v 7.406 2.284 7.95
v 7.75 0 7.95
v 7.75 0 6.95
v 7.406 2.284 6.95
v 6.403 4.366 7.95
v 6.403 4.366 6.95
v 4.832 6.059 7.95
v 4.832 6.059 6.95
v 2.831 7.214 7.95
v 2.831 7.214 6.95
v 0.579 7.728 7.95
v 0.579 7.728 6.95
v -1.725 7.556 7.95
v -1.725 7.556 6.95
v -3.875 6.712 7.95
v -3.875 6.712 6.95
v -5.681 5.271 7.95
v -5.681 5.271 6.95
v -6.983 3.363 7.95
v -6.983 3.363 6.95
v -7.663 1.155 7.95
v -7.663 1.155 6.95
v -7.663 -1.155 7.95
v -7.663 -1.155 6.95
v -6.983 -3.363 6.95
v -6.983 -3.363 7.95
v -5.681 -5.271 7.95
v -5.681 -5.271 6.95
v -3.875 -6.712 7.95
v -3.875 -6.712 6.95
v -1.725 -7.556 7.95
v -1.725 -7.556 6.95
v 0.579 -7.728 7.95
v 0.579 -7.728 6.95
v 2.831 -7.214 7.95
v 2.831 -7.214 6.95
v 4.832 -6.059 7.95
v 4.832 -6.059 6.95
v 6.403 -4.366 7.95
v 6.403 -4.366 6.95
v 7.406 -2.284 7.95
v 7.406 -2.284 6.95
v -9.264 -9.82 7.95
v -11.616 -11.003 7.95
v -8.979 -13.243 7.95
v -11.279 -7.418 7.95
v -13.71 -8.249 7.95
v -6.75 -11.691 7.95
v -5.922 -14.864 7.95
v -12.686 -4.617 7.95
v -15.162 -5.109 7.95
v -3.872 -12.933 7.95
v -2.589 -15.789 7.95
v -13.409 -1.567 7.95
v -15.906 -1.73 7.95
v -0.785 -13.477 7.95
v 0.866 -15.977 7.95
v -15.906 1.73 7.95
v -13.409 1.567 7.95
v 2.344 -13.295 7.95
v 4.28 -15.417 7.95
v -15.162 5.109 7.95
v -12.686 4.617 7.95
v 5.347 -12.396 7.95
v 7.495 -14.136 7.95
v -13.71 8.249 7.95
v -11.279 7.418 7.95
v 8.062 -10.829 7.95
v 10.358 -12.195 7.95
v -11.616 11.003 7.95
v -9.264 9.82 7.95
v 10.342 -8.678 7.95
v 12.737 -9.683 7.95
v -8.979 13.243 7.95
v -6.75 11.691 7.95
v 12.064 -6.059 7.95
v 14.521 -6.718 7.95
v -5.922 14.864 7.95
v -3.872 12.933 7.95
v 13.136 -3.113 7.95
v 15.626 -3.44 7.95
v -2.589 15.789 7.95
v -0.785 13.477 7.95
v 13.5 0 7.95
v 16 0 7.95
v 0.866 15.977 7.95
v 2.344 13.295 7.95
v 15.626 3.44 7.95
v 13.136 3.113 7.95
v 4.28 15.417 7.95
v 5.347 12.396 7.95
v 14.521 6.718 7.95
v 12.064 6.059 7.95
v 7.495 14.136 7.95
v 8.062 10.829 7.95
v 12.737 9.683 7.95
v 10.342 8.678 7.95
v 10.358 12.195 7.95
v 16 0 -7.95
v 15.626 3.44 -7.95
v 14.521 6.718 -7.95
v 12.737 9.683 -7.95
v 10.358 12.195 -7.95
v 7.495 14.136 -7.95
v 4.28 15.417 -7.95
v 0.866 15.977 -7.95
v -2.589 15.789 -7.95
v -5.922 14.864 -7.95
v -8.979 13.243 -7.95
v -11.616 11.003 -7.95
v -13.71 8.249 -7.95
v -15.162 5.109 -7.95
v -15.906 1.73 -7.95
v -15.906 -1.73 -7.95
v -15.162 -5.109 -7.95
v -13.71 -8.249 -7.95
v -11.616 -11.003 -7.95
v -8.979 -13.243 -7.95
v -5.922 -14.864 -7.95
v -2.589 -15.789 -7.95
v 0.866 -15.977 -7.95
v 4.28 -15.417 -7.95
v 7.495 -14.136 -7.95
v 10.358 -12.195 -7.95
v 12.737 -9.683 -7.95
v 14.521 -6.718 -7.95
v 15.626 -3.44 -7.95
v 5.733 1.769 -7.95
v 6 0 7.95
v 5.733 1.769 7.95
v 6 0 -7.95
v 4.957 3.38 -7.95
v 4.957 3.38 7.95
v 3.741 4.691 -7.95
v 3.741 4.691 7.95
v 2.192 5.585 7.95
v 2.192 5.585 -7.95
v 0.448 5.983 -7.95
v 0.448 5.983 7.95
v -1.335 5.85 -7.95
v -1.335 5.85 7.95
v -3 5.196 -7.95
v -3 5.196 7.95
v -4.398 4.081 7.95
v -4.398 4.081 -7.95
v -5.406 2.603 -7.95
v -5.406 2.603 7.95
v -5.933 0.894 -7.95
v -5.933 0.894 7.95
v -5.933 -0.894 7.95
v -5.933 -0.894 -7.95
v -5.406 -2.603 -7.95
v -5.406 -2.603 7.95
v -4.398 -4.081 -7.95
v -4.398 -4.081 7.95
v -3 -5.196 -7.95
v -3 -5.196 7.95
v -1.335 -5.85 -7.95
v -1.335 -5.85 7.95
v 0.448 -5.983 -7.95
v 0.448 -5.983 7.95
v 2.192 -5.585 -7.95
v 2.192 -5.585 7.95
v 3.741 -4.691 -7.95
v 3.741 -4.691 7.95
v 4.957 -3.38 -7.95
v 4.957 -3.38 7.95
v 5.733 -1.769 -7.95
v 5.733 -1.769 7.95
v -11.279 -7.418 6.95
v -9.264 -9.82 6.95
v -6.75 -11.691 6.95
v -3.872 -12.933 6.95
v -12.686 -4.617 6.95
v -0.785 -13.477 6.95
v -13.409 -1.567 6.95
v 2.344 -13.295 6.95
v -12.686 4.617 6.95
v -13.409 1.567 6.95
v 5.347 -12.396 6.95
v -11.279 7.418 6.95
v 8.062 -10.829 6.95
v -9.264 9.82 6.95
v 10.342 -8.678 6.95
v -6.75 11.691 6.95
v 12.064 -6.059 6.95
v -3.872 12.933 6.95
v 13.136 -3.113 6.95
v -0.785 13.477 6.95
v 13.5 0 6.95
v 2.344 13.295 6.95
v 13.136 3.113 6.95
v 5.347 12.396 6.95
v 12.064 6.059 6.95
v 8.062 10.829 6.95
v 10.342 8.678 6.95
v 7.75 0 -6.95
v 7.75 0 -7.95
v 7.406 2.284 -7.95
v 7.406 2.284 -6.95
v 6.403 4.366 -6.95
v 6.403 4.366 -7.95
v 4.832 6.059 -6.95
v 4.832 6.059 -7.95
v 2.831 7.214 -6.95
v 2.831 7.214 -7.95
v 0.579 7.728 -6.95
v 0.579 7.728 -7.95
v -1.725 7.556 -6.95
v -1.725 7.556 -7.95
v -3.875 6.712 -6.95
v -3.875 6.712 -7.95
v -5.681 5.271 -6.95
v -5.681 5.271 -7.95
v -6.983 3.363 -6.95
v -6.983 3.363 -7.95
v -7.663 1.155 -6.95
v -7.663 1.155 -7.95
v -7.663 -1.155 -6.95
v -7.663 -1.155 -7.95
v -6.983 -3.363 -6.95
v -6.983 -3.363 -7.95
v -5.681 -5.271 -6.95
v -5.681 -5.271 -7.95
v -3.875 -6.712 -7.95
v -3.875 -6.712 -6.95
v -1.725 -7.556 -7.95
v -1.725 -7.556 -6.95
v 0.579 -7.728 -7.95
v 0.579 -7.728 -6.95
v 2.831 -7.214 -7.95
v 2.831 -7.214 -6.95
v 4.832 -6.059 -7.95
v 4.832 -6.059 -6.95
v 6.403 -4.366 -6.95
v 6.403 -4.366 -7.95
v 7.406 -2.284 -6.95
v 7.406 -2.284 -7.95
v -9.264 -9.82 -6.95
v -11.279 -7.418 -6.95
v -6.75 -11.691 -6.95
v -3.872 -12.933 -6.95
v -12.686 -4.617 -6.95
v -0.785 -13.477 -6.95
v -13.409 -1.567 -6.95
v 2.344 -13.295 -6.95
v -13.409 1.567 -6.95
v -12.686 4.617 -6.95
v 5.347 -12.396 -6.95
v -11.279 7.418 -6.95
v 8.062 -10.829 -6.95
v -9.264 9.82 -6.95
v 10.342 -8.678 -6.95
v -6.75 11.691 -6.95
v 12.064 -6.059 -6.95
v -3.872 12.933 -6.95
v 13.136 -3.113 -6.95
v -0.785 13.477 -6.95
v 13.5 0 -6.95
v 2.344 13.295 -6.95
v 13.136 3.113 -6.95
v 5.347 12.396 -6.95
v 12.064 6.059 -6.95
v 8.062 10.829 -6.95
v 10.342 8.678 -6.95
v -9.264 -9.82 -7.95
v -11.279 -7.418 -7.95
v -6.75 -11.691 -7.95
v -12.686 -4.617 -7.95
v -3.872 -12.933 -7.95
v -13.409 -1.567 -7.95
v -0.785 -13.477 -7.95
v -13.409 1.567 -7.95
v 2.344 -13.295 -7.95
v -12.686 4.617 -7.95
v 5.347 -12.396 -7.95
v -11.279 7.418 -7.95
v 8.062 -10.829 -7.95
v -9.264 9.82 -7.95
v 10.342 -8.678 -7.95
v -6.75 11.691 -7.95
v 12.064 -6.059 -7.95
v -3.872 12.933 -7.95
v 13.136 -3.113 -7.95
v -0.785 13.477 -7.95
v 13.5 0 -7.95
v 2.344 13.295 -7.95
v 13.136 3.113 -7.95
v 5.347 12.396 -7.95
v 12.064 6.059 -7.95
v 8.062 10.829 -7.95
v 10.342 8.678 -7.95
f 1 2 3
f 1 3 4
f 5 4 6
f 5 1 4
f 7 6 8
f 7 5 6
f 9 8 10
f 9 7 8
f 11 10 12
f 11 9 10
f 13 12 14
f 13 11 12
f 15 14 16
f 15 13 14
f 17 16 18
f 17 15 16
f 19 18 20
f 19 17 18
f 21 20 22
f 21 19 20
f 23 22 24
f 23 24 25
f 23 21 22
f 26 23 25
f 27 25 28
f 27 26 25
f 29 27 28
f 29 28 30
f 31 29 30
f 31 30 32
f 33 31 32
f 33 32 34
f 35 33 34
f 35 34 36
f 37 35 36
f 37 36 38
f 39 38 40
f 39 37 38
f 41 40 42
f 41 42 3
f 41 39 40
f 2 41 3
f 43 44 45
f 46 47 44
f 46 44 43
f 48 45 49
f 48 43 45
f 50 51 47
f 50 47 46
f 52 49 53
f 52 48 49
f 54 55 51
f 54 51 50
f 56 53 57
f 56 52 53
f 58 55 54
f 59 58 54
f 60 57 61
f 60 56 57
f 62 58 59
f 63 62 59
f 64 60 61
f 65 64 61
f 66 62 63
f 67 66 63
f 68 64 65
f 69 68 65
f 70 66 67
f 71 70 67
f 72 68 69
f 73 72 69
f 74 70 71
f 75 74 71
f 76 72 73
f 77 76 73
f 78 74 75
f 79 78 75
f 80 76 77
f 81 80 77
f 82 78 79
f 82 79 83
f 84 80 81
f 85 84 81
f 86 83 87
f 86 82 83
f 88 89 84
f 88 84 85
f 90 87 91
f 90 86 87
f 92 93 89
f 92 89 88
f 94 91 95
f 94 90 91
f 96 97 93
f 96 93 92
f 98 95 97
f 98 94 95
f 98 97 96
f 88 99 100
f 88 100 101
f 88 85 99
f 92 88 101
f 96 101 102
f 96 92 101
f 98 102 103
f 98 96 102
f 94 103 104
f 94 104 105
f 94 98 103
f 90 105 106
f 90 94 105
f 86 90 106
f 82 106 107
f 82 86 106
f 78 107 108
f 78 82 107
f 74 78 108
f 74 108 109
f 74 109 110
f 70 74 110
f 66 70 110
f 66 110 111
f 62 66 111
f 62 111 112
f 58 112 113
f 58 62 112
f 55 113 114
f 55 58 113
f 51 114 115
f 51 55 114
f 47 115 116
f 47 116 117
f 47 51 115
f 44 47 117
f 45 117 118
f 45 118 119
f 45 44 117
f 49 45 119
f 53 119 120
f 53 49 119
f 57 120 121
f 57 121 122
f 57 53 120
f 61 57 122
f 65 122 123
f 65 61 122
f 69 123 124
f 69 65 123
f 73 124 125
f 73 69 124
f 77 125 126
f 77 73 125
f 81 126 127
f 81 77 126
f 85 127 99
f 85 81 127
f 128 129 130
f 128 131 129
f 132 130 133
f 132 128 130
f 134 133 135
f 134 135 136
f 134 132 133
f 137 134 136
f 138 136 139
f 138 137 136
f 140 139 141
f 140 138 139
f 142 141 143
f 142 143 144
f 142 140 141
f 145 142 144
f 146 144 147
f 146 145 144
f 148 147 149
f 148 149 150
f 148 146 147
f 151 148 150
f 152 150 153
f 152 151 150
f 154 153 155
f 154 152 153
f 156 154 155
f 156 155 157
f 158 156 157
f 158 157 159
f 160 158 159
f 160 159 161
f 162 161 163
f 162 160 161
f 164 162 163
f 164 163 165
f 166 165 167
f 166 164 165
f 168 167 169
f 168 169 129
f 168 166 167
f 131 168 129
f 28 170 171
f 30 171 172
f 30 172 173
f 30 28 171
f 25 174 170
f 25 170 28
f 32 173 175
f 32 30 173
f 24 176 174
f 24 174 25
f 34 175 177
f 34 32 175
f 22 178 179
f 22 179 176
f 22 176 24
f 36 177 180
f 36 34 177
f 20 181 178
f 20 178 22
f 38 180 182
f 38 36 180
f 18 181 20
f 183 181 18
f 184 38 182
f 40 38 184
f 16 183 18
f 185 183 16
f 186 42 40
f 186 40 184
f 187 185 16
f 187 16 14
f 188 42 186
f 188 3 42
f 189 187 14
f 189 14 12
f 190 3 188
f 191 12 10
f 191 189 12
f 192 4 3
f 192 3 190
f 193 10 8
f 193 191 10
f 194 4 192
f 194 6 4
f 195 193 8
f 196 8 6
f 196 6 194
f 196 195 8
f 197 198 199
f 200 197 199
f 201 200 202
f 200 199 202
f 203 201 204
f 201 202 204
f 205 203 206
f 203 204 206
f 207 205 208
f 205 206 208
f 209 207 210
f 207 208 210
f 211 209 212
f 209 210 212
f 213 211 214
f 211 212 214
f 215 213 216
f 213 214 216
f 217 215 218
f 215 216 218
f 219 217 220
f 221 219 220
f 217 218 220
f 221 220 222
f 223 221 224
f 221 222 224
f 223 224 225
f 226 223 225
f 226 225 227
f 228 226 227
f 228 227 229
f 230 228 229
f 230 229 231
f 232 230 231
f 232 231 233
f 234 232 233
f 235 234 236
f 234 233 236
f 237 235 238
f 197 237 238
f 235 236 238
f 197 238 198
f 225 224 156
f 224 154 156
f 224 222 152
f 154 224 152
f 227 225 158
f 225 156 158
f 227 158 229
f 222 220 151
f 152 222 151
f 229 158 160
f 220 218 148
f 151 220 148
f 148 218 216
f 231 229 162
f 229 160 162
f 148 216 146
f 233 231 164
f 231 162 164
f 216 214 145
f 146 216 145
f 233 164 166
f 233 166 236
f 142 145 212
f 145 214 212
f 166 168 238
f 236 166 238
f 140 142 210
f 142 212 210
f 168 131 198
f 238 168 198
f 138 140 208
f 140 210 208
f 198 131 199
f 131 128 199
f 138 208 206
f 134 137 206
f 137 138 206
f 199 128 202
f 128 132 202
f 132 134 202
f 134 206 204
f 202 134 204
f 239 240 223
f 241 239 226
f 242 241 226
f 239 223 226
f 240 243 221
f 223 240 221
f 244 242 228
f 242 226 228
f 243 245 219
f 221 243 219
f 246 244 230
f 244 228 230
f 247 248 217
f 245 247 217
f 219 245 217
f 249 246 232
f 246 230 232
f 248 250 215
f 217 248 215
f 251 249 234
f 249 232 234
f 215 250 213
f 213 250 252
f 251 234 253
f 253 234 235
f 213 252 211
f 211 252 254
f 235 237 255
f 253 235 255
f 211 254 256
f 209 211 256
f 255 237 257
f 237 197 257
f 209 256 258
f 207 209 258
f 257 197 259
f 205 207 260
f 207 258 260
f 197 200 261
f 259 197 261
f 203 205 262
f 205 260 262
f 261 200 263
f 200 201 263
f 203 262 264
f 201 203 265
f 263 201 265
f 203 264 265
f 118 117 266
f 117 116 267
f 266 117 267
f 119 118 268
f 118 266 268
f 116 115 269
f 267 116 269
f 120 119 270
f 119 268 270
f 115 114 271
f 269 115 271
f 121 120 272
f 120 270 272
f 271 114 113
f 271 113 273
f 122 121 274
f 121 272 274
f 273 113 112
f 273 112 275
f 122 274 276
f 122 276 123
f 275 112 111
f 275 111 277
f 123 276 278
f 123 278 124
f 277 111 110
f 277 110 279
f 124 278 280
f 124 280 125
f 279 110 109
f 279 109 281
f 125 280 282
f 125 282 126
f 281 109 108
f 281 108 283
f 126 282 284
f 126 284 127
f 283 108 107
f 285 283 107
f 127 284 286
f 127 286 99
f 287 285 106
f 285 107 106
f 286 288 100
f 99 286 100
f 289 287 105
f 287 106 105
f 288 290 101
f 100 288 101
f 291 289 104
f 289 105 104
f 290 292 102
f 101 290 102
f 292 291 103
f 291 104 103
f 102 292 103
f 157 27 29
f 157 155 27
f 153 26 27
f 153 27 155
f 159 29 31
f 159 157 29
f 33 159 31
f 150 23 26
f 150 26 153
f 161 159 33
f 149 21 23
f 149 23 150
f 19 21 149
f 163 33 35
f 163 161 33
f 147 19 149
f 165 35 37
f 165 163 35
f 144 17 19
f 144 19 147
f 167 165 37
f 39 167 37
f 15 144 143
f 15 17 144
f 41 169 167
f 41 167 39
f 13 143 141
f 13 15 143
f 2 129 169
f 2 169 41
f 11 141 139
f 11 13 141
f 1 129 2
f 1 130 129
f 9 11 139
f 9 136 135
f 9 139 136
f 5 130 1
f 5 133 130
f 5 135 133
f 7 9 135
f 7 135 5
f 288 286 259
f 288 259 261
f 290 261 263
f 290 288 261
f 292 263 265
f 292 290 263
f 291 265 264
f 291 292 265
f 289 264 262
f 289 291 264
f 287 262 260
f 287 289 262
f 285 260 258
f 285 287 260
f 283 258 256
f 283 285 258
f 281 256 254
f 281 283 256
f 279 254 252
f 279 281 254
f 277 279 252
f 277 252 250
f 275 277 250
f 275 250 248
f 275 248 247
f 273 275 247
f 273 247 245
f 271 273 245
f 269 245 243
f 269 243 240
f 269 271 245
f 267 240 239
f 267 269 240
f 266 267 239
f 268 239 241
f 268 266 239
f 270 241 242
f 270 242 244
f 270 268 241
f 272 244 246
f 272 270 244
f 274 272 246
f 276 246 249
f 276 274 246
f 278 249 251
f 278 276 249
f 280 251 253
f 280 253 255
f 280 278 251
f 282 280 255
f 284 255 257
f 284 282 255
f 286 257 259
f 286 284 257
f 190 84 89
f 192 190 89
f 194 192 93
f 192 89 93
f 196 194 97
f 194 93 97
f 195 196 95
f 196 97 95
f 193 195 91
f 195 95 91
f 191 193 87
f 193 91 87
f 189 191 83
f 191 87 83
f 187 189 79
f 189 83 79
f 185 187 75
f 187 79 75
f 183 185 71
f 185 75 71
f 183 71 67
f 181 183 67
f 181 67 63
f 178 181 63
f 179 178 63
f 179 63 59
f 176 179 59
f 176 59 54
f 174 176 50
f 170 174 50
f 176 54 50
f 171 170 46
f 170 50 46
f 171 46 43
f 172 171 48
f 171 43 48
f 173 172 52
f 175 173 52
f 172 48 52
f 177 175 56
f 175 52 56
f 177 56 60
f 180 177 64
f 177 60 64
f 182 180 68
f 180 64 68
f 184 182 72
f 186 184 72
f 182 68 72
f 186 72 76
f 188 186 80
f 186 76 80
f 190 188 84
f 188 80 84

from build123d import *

# Parameters (mm, degrees)
SKETCH083_R     = 16
SKETCH083_R_2   = 6
PAD029_DEPTH    = 7.95
SKETCH084_R     = 13.5
SKETCH084_R_2   = 7.75
POCKET048_DEPTH = 1


with BuildPart() as part:
    # Sketch083 → Pad029 (new body, symmetric)
    with BuildSketch(Plane.XY):
        Circle(SKETCH083_R)
        Circle(SKETCH083_R_2, mode=Mode.SUBTRACT)
    extrude(amount=PAD029_DEPTH, both=True)

    # Sketch084 (on Face4 of Pad029) → Pocket048 (cut)
    with BuildSketch(Plane.XY.offset(7.95)):
        Circle(SKETCH084_R)
        Circle(SKETCH084_R_2, mode=Mode.SUBTRACT)
    pocket048 = extrude(amount=-POCKET048_DEPTH, mode=Mode.SUBTRACT)

    # Mirrored001: Pocket048 across XY
    add(pocket048.mirror(Plane.XY), mode=Mode.SUBTRACT)


solid = part.part
